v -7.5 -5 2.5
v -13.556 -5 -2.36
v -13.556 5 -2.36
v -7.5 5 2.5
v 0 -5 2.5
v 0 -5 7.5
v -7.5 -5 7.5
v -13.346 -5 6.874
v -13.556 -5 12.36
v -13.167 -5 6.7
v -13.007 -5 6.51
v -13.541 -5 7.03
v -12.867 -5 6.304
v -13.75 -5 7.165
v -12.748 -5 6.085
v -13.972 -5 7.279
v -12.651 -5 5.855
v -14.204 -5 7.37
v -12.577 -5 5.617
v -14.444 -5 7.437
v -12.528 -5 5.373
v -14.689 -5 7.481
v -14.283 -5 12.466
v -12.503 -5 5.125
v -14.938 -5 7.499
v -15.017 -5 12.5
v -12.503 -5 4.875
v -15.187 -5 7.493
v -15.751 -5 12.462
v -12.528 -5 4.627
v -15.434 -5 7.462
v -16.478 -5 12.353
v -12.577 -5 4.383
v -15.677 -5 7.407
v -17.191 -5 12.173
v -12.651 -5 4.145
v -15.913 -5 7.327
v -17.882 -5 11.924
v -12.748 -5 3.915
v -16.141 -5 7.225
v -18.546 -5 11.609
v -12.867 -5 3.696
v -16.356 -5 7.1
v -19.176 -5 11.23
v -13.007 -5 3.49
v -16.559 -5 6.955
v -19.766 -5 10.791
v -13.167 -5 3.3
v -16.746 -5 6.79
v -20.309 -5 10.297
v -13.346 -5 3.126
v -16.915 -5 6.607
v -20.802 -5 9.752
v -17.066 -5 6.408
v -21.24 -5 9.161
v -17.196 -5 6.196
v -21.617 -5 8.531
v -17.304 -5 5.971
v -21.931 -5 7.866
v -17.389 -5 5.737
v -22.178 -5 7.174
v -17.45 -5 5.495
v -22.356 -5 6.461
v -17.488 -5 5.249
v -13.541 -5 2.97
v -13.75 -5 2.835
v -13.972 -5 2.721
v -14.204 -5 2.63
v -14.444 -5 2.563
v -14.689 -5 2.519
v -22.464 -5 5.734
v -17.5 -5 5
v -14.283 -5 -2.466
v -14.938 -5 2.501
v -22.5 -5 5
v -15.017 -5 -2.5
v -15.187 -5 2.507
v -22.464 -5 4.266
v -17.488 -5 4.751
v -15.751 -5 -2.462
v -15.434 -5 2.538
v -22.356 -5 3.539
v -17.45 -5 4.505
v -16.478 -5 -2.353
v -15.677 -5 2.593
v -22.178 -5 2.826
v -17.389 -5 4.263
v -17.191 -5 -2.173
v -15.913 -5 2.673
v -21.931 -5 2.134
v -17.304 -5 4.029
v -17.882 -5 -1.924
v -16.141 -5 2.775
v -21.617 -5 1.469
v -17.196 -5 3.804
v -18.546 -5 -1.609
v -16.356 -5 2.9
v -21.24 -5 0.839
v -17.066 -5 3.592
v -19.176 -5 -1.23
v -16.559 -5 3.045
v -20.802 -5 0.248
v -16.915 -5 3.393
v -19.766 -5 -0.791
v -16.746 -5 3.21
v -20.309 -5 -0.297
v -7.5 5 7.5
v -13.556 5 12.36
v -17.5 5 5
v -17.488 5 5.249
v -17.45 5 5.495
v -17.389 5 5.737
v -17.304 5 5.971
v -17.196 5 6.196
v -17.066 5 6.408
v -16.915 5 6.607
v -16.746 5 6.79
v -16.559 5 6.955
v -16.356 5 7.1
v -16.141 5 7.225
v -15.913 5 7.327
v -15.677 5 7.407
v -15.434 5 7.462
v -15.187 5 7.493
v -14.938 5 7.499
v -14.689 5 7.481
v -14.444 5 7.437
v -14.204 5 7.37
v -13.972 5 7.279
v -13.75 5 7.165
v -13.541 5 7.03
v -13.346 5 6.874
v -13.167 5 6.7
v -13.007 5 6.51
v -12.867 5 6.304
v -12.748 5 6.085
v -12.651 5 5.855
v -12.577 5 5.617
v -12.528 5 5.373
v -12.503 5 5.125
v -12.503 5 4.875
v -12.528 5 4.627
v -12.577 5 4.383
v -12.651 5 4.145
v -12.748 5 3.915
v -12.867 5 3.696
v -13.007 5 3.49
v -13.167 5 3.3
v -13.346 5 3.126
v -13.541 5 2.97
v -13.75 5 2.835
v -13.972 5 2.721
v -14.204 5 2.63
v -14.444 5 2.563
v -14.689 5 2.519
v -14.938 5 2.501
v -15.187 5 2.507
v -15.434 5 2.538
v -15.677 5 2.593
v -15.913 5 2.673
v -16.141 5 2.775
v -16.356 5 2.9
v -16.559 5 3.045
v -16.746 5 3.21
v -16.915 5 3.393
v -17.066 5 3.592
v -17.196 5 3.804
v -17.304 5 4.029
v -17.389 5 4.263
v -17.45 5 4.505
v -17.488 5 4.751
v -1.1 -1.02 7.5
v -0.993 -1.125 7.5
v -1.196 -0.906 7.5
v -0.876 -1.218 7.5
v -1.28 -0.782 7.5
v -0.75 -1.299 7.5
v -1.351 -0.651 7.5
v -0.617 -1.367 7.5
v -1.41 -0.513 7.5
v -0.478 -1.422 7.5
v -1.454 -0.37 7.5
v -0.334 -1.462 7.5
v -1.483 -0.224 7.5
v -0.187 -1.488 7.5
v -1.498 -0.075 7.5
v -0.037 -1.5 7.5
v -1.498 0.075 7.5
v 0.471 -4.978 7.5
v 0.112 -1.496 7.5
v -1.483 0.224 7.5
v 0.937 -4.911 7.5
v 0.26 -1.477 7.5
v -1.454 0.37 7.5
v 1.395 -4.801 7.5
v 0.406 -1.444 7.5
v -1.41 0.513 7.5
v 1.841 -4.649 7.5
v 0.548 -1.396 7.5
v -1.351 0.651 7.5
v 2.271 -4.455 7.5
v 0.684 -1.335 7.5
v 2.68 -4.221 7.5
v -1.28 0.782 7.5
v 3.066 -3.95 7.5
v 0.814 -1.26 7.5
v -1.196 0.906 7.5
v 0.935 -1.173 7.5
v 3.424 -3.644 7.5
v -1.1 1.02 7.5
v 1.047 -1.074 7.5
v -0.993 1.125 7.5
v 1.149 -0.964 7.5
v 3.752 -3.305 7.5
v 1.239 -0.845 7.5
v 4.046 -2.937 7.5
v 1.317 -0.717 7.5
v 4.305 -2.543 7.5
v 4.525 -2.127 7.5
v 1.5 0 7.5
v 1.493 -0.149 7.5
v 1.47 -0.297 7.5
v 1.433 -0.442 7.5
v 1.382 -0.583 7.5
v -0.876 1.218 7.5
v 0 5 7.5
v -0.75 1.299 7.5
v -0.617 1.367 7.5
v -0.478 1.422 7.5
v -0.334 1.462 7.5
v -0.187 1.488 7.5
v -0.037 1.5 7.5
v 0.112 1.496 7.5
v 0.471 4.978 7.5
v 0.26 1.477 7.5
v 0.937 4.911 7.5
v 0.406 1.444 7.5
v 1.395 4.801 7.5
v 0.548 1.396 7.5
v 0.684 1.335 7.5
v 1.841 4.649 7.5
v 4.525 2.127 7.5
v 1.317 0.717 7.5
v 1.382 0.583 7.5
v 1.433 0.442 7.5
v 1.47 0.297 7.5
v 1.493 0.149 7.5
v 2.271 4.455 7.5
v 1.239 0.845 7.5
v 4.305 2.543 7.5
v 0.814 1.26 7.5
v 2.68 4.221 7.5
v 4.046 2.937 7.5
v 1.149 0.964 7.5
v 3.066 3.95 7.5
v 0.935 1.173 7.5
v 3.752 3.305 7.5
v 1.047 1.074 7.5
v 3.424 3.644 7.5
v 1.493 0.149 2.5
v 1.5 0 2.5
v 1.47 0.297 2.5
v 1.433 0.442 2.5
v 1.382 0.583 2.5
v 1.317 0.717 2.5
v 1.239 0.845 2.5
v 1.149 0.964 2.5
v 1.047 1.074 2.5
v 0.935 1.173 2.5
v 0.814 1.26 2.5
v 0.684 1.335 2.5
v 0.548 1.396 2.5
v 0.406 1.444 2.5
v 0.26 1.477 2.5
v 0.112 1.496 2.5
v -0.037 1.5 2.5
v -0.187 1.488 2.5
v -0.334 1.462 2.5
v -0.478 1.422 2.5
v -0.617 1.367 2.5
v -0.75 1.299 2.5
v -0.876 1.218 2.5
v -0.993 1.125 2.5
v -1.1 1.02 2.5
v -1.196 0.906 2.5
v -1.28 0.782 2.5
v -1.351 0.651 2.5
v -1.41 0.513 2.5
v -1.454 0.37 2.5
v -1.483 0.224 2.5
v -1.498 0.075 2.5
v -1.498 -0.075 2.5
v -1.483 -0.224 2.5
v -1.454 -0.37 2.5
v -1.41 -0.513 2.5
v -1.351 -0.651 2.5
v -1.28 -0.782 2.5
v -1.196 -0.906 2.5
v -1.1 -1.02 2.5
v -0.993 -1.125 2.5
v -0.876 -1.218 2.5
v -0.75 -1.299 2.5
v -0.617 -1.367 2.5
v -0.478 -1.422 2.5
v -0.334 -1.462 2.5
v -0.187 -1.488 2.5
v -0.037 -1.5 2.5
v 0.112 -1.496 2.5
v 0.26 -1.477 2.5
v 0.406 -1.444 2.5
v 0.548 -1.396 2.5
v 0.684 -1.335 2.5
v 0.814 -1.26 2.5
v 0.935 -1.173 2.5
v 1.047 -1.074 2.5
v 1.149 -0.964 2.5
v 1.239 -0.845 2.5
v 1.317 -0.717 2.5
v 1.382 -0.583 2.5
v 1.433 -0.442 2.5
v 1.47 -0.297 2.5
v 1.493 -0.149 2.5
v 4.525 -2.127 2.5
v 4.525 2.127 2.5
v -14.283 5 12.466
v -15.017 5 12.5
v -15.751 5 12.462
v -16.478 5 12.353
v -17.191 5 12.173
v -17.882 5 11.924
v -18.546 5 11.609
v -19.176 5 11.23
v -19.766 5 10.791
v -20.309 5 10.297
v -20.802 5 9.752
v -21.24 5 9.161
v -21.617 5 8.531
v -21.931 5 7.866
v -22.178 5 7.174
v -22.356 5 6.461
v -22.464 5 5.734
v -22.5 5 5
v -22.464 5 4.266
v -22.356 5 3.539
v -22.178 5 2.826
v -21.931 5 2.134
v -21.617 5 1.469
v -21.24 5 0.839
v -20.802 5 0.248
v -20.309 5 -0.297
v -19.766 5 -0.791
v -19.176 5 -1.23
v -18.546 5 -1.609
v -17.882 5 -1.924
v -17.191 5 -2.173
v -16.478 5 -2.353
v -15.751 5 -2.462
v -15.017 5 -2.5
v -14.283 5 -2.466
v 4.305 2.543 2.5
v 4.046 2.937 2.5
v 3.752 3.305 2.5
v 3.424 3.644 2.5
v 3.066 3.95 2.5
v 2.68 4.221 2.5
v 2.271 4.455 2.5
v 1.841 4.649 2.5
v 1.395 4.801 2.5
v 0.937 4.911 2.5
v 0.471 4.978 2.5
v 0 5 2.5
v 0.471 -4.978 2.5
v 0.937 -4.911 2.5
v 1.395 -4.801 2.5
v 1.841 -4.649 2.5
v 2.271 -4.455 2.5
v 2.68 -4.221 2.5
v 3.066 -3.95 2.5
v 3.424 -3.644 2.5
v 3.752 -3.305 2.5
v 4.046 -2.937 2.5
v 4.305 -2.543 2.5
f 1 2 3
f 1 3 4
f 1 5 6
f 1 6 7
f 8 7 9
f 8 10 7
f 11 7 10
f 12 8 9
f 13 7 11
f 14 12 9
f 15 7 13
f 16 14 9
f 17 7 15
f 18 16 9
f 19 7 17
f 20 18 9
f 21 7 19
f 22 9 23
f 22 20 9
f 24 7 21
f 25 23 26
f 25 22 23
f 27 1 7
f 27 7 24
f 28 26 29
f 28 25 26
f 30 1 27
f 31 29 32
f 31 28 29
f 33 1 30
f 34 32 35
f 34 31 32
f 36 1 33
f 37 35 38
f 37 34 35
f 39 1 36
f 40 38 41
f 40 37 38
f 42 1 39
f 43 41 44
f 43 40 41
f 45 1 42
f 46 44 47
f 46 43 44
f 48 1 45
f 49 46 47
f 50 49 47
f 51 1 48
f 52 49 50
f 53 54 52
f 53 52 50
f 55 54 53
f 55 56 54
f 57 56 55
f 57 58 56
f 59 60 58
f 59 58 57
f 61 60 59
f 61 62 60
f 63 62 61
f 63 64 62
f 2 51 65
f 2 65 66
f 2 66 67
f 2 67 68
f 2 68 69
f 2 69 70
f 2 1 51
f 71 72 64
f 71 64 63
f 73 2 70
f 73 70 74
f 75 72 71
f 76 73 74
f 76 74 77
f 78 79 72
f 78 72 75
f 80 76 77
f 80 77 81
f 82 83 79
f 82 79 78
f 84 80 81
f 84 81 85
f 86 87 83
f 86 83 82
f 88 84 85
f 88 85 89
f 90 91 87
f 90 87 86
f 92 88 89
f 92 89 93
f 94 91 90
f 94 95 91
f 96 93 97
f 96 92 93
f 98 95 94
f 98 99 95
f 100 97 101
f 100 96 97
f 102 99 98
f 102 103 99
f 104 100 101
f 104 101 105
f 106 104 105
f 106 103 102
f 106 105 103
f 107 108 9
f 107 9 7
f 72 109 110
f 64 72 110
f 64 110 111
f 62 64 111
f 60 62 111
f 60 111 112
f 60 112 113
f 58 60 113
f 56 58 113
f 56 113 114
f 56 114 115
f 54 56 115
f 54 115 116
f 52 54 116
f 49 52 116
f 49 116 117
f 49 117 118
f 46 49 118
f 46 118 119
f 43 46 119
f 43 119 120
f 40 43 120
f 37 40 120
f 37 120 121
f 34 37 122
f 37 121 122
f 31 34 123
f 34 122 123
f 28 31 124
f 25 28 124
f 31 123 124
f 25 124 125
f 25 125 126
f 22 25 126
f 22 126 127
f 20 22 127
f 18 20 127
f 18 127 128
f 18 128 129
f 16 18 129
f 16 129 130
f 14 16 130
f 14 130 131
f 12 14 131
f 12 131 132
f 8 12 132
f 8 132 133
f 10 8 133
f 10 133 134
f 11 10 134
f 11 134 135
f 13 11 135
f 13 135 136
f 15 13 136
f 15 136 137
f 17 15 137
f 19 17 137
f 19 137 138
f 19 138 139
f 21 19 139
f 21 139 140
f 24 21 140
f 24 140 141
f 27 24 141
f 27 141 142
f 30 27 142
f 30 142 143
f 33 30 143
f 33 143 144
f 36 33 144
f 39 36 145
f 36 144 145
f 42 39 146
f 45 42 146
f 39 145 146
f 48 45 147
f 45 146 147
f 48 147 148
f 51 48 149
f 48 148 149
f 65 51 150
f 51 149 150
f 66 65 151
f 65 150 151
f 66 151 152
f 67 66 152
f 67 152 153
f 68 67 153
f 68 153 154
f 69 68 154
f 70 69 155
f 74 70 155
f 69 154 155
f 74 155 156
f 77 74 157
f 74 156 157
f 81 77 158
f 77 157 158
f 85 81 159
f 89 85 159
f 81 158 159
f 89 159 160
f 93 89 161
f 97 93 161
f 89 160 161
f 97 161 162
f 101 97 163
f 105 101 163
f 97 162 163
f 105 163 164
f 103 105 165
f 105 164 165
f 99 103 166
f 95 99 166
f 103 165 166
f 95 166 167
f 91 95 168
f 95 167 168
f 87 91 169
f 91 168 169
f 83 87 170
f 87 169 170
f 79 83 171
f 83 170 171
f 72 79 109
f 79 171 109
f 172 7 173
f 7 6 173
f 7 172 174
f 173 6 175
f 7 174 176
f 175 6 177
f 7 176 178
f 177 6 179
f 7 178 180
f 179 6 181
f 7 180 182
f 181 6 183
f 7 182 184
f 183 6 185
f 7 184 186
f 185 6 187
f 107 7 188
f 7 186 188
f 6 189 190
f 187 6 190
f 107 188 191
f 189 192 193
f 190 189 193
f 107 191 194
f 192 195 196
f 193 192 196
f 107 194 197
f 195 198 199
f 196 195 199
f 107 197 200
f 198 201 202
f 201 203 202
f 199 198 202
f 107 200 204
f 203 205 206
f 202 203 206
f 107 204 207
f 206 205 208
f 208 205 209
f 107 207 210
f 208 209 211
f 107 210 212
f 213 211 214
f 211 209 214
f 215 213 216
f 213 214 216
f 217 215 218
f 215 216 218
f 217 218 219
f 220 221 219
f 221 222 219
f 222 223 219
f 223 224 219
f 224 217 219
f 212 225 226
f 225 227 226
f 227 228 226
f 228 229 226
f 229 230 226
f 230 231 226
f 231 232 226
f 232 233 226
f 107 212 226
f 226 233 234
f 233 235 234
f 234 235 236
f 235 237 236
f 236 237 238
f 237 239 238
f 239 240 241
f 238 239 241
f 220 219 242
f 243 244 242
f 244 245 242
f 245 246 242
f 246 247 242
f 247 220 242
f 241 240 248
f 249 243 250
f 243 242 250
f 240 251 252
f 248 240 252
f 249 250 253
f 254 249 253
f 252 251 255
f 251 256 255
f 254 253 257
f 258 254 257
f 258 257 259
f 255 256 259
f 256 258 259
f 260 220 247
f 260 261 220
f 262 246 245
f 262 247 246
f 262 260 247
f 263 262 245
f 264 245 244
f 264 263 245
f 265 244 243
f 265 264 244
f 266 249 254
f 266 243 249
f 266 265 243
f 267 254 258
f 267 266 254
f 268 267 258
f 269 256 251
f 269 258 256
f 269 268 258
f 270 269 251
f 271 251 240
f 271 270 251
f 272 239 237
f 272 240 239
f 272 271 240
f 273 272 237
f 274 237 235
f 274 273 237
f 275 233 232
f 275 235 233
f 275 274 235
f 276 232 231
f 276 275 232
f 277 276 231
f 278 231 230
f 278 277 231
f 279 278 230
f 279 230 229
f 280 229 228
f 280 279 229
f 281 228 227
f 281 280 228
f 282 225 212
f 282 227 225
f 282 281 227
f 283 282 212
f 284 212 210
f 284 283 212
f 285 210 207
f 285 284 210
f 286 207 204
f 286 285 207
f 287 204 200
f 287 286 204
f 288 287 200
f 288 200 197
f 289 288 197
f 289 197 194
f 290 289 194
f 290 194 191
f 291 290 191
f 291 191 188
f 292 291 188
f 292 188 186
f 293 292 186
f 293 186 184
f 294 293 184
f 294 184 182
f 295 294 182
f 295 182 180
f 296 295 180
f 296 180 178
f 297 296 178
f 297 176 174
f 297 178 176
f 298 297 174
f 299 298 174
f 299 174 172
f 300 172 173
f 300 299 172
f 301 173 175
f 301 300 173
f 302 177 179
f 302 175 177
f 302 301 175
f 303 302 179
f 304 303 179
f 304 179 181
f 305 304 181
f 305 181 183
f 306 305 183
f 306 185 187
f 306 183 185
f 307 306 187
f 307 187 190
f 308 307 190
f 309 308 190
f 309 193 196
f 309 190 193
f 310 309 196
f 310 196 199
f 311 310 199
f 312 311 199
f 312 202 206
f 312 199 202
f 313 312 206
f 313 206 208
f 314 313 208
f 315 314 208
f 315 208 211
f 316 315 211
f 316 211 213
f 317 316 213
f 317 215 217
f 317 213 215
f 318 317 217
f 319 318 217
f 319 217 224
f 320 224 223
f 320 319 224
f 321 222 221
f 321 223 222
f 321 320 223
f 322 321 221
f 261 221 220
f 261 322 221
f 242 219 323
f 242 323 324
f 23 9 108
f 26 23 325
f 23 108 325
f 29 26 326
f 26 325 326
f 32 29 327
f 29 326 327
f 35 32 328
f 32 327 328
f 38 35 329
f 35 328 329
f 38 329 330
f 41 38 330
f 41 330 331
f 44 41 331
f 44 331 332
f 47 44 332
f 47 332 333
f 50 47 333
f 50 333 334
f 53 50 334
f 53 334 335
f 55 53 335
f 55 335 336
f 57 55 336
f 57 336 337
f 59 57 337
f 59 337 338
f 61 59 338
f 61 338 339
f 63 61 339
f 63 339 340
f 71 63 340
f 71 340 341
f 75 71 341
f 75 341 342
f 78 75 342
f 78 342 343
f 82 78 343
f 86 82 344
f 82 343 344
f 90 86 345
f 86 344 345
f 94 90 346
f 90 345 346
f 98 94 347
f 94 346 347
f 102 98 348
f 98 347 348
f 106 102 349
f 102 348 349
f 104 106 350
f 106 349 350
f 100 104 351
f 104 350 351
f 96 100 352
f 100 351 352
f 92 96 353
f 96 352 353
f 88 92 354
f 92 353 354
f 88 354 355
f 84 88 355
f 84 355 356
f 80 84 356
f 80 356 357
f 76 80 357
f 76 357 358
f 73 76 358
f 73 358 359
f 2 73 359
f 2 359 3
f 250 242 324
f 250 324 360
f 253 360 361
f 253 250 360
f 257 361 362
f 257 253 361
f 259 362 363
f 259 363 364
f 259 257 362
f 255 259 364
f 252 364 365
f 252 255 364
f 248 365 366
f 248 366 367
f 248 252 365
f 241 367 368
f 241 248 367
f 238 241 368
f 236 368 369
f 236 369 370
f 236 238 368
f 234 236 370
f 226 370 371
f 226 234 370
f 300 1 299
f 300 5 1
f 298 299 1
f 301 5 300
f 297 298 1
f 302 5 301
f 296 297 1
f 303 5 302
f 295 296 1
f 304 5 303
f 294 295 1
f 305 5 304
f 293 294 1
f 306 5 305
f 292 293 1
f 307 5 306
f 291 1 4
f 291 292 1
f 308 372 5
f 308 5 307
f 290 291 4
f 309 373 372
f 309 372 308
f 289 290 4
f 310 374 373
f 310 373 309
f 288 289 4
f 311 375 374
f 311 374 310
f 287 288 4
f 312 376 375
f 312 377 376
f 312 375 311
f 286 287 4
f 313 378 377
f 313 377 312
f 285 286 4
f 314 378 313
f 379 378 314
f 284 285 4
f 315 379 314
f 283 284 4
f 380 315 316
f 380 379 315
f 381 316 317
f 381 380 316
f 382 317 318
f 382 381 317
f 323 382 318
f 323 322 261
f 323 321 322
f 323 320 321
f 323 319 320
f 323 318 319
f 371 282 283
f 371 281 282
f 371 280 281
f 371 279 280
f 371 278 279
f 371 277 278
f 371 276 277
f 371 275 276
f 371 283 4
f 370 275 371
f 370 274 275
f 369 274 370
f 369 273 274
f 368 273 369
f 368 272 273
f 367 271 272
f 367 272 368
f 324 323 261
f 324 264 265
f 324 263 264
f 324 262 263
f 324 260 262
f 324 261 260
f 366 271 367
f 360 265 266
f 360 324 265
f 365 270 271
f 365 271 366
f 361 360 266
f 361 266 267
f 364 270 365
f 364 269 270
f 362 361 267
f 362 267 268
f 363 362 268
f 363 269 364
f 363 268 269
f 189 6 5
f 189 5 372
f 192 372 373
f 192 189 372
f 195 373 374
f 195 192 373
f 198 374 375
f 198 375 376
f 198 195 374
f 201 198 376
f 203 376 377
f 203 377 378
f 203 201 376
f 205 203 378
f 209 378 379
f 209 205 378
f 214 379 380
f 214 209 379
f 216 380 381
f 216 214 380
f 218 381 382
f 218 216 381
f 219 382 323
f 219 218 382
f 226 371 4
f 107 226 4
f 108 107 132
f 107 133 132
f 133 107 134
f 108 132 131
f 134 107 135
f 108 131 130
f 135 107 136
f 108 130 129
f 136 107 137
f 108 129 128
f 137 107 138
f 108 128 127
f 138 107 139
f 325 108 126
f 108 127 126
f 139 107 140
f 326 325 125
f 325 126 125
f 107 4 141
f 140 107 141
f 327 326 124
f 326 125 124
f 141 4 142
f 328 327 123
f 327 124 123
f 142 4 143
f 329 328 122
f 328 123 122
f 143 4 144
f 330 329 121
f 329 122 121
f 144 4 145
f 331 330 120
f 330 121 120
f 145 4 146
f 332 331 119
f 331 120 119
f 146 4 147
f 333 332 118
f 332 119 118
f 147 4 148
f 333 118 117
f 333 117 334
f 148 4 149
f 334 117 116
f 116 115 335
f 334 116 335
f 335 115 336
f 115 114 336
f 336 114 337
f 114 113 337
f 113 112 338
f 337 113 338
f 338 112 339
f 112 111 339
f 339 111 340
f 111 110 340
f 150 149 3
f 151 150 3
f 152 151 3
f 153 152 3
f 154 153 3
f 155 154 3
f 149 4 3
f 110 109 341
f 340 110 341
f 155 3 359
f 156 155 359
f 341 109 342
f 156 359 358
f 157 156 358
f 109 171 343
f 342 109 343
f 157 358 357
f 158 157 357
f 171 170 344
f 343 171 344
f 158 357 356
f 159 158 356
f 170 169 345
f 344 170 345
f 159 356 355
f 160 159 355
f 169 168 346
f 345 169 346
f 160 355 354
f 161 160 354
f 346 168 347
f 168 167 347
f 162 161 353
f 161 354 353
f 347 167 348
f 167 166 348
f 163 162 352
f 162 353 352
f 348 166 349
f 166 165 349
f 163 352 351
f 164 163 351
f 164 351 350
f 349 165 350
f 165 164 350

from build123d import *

# Parameters (mm, degrees)
CROQUIS1_W              = 25
CROQUIS1_H              = 10
CROQUIS1_R              = 1.5
SALIENTE_EXTRUIR1_DEPTH = 10
CROQUIS2_R              = 2.5
CORTAR_EXTRUIR1_DEPTH   = 14
CROQUIS3_OUTSIDE_W      = 17.744
CROQUIS3_OUTSIDE_H      = 17.744
CROQUIS3_OUTSIDE_W_2    = 5
CROQUIS3_OUTSIDE_H_2    = 10
CORTAR_EXTRUIR2_DEPTH   = 12.5
CUT_EXTRUDE1_DEPTH      = 10
CROQUIS5_R              = 2.5
SALIENTE_EXTRUIR5_DEPTH = 10
CORTAR_EXTRUIR3_DEPTH   = 28.613402543


with BuildPart() as part:
    # Croquis1 → Saliente-Extruir1 (new body)
    with BuildSketch(Plane.XY):
        with Locations((-7.5, 0)):
            Rectangle(CROQUIS1_W, CROQUIS1_H)
        Circle(CROQUIS1_R, mode=Mode.SUBTRACT)
    extrude(amount=SALIENTE_EXTRUIR1_DEPTH)

    # Croquis2 → Cortar-Extruir1 (cut)
    with BuildSketch(Plane(origin=(0, 5, 0), x_dir=(1, 0, 0), z_dir=(0, 1, 0))):
        with Locations(Location((-15, -5, 0), (0, 0, 180))):
            Circle(CROQUIS2_R)
    extrude(amount=-CORTAR_EXTRUIR1_DEPTH, mode=Mode.SUBTRACT)

    # Croquis3 outside → Cortar-Extruir2 (cut)
    with BuildSketch(Plane(origin=(5, 0, 0), x_dir=(0, 0, -1), z_dir=(1, 0, 0))):
        with Locations((-5, 0)):
            Rectangle(CROQUIS3_OUTSIDE_W, CROQUIS3_OUTSIDE_H)
        with Locations((-5, 0)):
            Rectangle(CROQUIS3_OUTSIDE_W_2, CROQUIS3_OUTSIDE_H_2, mode=Mode.SUBTRACT)
    extrude(amount=-CORTAR_EXTRUIR2_DEPTH, mode=Mode.SUBTRACT)

    # Sketch1 → Cut-Extrude1 (cut)
    with BuildSketch(Plane.XY.offset(10)):
        with BuildLine():
            Line((0, 5), (5.992915048, 5))
            Line((5.992915048, 5), (5.992915048, -6.748814934))
            Line((5.992915048, -6.748814934), (0, -5))
            ThreePointArc((0, -5), (2.680080756, -4.221038633), (4.525089765, -2.126866856))
            Line((4.525089765, -2.126866856), (4.525089765, 2.126866856))
            ThreePointArc((4.525089765, 2.126866856), (2.680080756, 4.221038633), (0, 5))
        make_face()
    extrude(amount=-CUT_EXTRUDE1_DEPTH, mode=Mode.SUBTRACT)

    # Croquis5 → Saliente-Extruir5 (add)
    with BuildSketch(Plane(origin=(0, 5, 0), x_dir=(1, 0, 0), z_dir=(0, 1, 0))):
        with BuildLine():
            Line((-12.115384615, 1.923076923), (-7.5, 0))
            Line((-7.5, 0), (-7.5, -10))
            Line((-7.5, -10), (-11.574224798, -11.67188611))
            ThreePointArc((-11.574224798, -11.67188611), (-22.494065139, -5.298308051), (-12.115384615, 1.923076923))
        make_face()
        with Locations(Location((-15, -5, 0), (0, 0, 180))):
            Circle(CROQUIS5_R, mode=Mode.SUBTRACT)
    extrude(amount=-SALIENTE_EXTRUIR5_DEPTH)

    # Croquis6 → Cortar-Extruir3 (cut, through all)
    with BuildSketch(Plane(origin=(0, 5, 0), x_dir=(1, 0, 0), z_dir=(0, 1, 0))):
        Polygon((-13.556059362, 2.359689901), (-7.5, -2.5), (-7.5, 2.359689901), align=None)
        Polygon((-7.5, -7.5), (-7.5, -12.359689901), (-13.556059362, -12.359689901), align=None)
    extrude(amount=-CORTAR_EXTRUIR3_DEPTH, mode=Mode.SUBTRACT)


solid = part.part
